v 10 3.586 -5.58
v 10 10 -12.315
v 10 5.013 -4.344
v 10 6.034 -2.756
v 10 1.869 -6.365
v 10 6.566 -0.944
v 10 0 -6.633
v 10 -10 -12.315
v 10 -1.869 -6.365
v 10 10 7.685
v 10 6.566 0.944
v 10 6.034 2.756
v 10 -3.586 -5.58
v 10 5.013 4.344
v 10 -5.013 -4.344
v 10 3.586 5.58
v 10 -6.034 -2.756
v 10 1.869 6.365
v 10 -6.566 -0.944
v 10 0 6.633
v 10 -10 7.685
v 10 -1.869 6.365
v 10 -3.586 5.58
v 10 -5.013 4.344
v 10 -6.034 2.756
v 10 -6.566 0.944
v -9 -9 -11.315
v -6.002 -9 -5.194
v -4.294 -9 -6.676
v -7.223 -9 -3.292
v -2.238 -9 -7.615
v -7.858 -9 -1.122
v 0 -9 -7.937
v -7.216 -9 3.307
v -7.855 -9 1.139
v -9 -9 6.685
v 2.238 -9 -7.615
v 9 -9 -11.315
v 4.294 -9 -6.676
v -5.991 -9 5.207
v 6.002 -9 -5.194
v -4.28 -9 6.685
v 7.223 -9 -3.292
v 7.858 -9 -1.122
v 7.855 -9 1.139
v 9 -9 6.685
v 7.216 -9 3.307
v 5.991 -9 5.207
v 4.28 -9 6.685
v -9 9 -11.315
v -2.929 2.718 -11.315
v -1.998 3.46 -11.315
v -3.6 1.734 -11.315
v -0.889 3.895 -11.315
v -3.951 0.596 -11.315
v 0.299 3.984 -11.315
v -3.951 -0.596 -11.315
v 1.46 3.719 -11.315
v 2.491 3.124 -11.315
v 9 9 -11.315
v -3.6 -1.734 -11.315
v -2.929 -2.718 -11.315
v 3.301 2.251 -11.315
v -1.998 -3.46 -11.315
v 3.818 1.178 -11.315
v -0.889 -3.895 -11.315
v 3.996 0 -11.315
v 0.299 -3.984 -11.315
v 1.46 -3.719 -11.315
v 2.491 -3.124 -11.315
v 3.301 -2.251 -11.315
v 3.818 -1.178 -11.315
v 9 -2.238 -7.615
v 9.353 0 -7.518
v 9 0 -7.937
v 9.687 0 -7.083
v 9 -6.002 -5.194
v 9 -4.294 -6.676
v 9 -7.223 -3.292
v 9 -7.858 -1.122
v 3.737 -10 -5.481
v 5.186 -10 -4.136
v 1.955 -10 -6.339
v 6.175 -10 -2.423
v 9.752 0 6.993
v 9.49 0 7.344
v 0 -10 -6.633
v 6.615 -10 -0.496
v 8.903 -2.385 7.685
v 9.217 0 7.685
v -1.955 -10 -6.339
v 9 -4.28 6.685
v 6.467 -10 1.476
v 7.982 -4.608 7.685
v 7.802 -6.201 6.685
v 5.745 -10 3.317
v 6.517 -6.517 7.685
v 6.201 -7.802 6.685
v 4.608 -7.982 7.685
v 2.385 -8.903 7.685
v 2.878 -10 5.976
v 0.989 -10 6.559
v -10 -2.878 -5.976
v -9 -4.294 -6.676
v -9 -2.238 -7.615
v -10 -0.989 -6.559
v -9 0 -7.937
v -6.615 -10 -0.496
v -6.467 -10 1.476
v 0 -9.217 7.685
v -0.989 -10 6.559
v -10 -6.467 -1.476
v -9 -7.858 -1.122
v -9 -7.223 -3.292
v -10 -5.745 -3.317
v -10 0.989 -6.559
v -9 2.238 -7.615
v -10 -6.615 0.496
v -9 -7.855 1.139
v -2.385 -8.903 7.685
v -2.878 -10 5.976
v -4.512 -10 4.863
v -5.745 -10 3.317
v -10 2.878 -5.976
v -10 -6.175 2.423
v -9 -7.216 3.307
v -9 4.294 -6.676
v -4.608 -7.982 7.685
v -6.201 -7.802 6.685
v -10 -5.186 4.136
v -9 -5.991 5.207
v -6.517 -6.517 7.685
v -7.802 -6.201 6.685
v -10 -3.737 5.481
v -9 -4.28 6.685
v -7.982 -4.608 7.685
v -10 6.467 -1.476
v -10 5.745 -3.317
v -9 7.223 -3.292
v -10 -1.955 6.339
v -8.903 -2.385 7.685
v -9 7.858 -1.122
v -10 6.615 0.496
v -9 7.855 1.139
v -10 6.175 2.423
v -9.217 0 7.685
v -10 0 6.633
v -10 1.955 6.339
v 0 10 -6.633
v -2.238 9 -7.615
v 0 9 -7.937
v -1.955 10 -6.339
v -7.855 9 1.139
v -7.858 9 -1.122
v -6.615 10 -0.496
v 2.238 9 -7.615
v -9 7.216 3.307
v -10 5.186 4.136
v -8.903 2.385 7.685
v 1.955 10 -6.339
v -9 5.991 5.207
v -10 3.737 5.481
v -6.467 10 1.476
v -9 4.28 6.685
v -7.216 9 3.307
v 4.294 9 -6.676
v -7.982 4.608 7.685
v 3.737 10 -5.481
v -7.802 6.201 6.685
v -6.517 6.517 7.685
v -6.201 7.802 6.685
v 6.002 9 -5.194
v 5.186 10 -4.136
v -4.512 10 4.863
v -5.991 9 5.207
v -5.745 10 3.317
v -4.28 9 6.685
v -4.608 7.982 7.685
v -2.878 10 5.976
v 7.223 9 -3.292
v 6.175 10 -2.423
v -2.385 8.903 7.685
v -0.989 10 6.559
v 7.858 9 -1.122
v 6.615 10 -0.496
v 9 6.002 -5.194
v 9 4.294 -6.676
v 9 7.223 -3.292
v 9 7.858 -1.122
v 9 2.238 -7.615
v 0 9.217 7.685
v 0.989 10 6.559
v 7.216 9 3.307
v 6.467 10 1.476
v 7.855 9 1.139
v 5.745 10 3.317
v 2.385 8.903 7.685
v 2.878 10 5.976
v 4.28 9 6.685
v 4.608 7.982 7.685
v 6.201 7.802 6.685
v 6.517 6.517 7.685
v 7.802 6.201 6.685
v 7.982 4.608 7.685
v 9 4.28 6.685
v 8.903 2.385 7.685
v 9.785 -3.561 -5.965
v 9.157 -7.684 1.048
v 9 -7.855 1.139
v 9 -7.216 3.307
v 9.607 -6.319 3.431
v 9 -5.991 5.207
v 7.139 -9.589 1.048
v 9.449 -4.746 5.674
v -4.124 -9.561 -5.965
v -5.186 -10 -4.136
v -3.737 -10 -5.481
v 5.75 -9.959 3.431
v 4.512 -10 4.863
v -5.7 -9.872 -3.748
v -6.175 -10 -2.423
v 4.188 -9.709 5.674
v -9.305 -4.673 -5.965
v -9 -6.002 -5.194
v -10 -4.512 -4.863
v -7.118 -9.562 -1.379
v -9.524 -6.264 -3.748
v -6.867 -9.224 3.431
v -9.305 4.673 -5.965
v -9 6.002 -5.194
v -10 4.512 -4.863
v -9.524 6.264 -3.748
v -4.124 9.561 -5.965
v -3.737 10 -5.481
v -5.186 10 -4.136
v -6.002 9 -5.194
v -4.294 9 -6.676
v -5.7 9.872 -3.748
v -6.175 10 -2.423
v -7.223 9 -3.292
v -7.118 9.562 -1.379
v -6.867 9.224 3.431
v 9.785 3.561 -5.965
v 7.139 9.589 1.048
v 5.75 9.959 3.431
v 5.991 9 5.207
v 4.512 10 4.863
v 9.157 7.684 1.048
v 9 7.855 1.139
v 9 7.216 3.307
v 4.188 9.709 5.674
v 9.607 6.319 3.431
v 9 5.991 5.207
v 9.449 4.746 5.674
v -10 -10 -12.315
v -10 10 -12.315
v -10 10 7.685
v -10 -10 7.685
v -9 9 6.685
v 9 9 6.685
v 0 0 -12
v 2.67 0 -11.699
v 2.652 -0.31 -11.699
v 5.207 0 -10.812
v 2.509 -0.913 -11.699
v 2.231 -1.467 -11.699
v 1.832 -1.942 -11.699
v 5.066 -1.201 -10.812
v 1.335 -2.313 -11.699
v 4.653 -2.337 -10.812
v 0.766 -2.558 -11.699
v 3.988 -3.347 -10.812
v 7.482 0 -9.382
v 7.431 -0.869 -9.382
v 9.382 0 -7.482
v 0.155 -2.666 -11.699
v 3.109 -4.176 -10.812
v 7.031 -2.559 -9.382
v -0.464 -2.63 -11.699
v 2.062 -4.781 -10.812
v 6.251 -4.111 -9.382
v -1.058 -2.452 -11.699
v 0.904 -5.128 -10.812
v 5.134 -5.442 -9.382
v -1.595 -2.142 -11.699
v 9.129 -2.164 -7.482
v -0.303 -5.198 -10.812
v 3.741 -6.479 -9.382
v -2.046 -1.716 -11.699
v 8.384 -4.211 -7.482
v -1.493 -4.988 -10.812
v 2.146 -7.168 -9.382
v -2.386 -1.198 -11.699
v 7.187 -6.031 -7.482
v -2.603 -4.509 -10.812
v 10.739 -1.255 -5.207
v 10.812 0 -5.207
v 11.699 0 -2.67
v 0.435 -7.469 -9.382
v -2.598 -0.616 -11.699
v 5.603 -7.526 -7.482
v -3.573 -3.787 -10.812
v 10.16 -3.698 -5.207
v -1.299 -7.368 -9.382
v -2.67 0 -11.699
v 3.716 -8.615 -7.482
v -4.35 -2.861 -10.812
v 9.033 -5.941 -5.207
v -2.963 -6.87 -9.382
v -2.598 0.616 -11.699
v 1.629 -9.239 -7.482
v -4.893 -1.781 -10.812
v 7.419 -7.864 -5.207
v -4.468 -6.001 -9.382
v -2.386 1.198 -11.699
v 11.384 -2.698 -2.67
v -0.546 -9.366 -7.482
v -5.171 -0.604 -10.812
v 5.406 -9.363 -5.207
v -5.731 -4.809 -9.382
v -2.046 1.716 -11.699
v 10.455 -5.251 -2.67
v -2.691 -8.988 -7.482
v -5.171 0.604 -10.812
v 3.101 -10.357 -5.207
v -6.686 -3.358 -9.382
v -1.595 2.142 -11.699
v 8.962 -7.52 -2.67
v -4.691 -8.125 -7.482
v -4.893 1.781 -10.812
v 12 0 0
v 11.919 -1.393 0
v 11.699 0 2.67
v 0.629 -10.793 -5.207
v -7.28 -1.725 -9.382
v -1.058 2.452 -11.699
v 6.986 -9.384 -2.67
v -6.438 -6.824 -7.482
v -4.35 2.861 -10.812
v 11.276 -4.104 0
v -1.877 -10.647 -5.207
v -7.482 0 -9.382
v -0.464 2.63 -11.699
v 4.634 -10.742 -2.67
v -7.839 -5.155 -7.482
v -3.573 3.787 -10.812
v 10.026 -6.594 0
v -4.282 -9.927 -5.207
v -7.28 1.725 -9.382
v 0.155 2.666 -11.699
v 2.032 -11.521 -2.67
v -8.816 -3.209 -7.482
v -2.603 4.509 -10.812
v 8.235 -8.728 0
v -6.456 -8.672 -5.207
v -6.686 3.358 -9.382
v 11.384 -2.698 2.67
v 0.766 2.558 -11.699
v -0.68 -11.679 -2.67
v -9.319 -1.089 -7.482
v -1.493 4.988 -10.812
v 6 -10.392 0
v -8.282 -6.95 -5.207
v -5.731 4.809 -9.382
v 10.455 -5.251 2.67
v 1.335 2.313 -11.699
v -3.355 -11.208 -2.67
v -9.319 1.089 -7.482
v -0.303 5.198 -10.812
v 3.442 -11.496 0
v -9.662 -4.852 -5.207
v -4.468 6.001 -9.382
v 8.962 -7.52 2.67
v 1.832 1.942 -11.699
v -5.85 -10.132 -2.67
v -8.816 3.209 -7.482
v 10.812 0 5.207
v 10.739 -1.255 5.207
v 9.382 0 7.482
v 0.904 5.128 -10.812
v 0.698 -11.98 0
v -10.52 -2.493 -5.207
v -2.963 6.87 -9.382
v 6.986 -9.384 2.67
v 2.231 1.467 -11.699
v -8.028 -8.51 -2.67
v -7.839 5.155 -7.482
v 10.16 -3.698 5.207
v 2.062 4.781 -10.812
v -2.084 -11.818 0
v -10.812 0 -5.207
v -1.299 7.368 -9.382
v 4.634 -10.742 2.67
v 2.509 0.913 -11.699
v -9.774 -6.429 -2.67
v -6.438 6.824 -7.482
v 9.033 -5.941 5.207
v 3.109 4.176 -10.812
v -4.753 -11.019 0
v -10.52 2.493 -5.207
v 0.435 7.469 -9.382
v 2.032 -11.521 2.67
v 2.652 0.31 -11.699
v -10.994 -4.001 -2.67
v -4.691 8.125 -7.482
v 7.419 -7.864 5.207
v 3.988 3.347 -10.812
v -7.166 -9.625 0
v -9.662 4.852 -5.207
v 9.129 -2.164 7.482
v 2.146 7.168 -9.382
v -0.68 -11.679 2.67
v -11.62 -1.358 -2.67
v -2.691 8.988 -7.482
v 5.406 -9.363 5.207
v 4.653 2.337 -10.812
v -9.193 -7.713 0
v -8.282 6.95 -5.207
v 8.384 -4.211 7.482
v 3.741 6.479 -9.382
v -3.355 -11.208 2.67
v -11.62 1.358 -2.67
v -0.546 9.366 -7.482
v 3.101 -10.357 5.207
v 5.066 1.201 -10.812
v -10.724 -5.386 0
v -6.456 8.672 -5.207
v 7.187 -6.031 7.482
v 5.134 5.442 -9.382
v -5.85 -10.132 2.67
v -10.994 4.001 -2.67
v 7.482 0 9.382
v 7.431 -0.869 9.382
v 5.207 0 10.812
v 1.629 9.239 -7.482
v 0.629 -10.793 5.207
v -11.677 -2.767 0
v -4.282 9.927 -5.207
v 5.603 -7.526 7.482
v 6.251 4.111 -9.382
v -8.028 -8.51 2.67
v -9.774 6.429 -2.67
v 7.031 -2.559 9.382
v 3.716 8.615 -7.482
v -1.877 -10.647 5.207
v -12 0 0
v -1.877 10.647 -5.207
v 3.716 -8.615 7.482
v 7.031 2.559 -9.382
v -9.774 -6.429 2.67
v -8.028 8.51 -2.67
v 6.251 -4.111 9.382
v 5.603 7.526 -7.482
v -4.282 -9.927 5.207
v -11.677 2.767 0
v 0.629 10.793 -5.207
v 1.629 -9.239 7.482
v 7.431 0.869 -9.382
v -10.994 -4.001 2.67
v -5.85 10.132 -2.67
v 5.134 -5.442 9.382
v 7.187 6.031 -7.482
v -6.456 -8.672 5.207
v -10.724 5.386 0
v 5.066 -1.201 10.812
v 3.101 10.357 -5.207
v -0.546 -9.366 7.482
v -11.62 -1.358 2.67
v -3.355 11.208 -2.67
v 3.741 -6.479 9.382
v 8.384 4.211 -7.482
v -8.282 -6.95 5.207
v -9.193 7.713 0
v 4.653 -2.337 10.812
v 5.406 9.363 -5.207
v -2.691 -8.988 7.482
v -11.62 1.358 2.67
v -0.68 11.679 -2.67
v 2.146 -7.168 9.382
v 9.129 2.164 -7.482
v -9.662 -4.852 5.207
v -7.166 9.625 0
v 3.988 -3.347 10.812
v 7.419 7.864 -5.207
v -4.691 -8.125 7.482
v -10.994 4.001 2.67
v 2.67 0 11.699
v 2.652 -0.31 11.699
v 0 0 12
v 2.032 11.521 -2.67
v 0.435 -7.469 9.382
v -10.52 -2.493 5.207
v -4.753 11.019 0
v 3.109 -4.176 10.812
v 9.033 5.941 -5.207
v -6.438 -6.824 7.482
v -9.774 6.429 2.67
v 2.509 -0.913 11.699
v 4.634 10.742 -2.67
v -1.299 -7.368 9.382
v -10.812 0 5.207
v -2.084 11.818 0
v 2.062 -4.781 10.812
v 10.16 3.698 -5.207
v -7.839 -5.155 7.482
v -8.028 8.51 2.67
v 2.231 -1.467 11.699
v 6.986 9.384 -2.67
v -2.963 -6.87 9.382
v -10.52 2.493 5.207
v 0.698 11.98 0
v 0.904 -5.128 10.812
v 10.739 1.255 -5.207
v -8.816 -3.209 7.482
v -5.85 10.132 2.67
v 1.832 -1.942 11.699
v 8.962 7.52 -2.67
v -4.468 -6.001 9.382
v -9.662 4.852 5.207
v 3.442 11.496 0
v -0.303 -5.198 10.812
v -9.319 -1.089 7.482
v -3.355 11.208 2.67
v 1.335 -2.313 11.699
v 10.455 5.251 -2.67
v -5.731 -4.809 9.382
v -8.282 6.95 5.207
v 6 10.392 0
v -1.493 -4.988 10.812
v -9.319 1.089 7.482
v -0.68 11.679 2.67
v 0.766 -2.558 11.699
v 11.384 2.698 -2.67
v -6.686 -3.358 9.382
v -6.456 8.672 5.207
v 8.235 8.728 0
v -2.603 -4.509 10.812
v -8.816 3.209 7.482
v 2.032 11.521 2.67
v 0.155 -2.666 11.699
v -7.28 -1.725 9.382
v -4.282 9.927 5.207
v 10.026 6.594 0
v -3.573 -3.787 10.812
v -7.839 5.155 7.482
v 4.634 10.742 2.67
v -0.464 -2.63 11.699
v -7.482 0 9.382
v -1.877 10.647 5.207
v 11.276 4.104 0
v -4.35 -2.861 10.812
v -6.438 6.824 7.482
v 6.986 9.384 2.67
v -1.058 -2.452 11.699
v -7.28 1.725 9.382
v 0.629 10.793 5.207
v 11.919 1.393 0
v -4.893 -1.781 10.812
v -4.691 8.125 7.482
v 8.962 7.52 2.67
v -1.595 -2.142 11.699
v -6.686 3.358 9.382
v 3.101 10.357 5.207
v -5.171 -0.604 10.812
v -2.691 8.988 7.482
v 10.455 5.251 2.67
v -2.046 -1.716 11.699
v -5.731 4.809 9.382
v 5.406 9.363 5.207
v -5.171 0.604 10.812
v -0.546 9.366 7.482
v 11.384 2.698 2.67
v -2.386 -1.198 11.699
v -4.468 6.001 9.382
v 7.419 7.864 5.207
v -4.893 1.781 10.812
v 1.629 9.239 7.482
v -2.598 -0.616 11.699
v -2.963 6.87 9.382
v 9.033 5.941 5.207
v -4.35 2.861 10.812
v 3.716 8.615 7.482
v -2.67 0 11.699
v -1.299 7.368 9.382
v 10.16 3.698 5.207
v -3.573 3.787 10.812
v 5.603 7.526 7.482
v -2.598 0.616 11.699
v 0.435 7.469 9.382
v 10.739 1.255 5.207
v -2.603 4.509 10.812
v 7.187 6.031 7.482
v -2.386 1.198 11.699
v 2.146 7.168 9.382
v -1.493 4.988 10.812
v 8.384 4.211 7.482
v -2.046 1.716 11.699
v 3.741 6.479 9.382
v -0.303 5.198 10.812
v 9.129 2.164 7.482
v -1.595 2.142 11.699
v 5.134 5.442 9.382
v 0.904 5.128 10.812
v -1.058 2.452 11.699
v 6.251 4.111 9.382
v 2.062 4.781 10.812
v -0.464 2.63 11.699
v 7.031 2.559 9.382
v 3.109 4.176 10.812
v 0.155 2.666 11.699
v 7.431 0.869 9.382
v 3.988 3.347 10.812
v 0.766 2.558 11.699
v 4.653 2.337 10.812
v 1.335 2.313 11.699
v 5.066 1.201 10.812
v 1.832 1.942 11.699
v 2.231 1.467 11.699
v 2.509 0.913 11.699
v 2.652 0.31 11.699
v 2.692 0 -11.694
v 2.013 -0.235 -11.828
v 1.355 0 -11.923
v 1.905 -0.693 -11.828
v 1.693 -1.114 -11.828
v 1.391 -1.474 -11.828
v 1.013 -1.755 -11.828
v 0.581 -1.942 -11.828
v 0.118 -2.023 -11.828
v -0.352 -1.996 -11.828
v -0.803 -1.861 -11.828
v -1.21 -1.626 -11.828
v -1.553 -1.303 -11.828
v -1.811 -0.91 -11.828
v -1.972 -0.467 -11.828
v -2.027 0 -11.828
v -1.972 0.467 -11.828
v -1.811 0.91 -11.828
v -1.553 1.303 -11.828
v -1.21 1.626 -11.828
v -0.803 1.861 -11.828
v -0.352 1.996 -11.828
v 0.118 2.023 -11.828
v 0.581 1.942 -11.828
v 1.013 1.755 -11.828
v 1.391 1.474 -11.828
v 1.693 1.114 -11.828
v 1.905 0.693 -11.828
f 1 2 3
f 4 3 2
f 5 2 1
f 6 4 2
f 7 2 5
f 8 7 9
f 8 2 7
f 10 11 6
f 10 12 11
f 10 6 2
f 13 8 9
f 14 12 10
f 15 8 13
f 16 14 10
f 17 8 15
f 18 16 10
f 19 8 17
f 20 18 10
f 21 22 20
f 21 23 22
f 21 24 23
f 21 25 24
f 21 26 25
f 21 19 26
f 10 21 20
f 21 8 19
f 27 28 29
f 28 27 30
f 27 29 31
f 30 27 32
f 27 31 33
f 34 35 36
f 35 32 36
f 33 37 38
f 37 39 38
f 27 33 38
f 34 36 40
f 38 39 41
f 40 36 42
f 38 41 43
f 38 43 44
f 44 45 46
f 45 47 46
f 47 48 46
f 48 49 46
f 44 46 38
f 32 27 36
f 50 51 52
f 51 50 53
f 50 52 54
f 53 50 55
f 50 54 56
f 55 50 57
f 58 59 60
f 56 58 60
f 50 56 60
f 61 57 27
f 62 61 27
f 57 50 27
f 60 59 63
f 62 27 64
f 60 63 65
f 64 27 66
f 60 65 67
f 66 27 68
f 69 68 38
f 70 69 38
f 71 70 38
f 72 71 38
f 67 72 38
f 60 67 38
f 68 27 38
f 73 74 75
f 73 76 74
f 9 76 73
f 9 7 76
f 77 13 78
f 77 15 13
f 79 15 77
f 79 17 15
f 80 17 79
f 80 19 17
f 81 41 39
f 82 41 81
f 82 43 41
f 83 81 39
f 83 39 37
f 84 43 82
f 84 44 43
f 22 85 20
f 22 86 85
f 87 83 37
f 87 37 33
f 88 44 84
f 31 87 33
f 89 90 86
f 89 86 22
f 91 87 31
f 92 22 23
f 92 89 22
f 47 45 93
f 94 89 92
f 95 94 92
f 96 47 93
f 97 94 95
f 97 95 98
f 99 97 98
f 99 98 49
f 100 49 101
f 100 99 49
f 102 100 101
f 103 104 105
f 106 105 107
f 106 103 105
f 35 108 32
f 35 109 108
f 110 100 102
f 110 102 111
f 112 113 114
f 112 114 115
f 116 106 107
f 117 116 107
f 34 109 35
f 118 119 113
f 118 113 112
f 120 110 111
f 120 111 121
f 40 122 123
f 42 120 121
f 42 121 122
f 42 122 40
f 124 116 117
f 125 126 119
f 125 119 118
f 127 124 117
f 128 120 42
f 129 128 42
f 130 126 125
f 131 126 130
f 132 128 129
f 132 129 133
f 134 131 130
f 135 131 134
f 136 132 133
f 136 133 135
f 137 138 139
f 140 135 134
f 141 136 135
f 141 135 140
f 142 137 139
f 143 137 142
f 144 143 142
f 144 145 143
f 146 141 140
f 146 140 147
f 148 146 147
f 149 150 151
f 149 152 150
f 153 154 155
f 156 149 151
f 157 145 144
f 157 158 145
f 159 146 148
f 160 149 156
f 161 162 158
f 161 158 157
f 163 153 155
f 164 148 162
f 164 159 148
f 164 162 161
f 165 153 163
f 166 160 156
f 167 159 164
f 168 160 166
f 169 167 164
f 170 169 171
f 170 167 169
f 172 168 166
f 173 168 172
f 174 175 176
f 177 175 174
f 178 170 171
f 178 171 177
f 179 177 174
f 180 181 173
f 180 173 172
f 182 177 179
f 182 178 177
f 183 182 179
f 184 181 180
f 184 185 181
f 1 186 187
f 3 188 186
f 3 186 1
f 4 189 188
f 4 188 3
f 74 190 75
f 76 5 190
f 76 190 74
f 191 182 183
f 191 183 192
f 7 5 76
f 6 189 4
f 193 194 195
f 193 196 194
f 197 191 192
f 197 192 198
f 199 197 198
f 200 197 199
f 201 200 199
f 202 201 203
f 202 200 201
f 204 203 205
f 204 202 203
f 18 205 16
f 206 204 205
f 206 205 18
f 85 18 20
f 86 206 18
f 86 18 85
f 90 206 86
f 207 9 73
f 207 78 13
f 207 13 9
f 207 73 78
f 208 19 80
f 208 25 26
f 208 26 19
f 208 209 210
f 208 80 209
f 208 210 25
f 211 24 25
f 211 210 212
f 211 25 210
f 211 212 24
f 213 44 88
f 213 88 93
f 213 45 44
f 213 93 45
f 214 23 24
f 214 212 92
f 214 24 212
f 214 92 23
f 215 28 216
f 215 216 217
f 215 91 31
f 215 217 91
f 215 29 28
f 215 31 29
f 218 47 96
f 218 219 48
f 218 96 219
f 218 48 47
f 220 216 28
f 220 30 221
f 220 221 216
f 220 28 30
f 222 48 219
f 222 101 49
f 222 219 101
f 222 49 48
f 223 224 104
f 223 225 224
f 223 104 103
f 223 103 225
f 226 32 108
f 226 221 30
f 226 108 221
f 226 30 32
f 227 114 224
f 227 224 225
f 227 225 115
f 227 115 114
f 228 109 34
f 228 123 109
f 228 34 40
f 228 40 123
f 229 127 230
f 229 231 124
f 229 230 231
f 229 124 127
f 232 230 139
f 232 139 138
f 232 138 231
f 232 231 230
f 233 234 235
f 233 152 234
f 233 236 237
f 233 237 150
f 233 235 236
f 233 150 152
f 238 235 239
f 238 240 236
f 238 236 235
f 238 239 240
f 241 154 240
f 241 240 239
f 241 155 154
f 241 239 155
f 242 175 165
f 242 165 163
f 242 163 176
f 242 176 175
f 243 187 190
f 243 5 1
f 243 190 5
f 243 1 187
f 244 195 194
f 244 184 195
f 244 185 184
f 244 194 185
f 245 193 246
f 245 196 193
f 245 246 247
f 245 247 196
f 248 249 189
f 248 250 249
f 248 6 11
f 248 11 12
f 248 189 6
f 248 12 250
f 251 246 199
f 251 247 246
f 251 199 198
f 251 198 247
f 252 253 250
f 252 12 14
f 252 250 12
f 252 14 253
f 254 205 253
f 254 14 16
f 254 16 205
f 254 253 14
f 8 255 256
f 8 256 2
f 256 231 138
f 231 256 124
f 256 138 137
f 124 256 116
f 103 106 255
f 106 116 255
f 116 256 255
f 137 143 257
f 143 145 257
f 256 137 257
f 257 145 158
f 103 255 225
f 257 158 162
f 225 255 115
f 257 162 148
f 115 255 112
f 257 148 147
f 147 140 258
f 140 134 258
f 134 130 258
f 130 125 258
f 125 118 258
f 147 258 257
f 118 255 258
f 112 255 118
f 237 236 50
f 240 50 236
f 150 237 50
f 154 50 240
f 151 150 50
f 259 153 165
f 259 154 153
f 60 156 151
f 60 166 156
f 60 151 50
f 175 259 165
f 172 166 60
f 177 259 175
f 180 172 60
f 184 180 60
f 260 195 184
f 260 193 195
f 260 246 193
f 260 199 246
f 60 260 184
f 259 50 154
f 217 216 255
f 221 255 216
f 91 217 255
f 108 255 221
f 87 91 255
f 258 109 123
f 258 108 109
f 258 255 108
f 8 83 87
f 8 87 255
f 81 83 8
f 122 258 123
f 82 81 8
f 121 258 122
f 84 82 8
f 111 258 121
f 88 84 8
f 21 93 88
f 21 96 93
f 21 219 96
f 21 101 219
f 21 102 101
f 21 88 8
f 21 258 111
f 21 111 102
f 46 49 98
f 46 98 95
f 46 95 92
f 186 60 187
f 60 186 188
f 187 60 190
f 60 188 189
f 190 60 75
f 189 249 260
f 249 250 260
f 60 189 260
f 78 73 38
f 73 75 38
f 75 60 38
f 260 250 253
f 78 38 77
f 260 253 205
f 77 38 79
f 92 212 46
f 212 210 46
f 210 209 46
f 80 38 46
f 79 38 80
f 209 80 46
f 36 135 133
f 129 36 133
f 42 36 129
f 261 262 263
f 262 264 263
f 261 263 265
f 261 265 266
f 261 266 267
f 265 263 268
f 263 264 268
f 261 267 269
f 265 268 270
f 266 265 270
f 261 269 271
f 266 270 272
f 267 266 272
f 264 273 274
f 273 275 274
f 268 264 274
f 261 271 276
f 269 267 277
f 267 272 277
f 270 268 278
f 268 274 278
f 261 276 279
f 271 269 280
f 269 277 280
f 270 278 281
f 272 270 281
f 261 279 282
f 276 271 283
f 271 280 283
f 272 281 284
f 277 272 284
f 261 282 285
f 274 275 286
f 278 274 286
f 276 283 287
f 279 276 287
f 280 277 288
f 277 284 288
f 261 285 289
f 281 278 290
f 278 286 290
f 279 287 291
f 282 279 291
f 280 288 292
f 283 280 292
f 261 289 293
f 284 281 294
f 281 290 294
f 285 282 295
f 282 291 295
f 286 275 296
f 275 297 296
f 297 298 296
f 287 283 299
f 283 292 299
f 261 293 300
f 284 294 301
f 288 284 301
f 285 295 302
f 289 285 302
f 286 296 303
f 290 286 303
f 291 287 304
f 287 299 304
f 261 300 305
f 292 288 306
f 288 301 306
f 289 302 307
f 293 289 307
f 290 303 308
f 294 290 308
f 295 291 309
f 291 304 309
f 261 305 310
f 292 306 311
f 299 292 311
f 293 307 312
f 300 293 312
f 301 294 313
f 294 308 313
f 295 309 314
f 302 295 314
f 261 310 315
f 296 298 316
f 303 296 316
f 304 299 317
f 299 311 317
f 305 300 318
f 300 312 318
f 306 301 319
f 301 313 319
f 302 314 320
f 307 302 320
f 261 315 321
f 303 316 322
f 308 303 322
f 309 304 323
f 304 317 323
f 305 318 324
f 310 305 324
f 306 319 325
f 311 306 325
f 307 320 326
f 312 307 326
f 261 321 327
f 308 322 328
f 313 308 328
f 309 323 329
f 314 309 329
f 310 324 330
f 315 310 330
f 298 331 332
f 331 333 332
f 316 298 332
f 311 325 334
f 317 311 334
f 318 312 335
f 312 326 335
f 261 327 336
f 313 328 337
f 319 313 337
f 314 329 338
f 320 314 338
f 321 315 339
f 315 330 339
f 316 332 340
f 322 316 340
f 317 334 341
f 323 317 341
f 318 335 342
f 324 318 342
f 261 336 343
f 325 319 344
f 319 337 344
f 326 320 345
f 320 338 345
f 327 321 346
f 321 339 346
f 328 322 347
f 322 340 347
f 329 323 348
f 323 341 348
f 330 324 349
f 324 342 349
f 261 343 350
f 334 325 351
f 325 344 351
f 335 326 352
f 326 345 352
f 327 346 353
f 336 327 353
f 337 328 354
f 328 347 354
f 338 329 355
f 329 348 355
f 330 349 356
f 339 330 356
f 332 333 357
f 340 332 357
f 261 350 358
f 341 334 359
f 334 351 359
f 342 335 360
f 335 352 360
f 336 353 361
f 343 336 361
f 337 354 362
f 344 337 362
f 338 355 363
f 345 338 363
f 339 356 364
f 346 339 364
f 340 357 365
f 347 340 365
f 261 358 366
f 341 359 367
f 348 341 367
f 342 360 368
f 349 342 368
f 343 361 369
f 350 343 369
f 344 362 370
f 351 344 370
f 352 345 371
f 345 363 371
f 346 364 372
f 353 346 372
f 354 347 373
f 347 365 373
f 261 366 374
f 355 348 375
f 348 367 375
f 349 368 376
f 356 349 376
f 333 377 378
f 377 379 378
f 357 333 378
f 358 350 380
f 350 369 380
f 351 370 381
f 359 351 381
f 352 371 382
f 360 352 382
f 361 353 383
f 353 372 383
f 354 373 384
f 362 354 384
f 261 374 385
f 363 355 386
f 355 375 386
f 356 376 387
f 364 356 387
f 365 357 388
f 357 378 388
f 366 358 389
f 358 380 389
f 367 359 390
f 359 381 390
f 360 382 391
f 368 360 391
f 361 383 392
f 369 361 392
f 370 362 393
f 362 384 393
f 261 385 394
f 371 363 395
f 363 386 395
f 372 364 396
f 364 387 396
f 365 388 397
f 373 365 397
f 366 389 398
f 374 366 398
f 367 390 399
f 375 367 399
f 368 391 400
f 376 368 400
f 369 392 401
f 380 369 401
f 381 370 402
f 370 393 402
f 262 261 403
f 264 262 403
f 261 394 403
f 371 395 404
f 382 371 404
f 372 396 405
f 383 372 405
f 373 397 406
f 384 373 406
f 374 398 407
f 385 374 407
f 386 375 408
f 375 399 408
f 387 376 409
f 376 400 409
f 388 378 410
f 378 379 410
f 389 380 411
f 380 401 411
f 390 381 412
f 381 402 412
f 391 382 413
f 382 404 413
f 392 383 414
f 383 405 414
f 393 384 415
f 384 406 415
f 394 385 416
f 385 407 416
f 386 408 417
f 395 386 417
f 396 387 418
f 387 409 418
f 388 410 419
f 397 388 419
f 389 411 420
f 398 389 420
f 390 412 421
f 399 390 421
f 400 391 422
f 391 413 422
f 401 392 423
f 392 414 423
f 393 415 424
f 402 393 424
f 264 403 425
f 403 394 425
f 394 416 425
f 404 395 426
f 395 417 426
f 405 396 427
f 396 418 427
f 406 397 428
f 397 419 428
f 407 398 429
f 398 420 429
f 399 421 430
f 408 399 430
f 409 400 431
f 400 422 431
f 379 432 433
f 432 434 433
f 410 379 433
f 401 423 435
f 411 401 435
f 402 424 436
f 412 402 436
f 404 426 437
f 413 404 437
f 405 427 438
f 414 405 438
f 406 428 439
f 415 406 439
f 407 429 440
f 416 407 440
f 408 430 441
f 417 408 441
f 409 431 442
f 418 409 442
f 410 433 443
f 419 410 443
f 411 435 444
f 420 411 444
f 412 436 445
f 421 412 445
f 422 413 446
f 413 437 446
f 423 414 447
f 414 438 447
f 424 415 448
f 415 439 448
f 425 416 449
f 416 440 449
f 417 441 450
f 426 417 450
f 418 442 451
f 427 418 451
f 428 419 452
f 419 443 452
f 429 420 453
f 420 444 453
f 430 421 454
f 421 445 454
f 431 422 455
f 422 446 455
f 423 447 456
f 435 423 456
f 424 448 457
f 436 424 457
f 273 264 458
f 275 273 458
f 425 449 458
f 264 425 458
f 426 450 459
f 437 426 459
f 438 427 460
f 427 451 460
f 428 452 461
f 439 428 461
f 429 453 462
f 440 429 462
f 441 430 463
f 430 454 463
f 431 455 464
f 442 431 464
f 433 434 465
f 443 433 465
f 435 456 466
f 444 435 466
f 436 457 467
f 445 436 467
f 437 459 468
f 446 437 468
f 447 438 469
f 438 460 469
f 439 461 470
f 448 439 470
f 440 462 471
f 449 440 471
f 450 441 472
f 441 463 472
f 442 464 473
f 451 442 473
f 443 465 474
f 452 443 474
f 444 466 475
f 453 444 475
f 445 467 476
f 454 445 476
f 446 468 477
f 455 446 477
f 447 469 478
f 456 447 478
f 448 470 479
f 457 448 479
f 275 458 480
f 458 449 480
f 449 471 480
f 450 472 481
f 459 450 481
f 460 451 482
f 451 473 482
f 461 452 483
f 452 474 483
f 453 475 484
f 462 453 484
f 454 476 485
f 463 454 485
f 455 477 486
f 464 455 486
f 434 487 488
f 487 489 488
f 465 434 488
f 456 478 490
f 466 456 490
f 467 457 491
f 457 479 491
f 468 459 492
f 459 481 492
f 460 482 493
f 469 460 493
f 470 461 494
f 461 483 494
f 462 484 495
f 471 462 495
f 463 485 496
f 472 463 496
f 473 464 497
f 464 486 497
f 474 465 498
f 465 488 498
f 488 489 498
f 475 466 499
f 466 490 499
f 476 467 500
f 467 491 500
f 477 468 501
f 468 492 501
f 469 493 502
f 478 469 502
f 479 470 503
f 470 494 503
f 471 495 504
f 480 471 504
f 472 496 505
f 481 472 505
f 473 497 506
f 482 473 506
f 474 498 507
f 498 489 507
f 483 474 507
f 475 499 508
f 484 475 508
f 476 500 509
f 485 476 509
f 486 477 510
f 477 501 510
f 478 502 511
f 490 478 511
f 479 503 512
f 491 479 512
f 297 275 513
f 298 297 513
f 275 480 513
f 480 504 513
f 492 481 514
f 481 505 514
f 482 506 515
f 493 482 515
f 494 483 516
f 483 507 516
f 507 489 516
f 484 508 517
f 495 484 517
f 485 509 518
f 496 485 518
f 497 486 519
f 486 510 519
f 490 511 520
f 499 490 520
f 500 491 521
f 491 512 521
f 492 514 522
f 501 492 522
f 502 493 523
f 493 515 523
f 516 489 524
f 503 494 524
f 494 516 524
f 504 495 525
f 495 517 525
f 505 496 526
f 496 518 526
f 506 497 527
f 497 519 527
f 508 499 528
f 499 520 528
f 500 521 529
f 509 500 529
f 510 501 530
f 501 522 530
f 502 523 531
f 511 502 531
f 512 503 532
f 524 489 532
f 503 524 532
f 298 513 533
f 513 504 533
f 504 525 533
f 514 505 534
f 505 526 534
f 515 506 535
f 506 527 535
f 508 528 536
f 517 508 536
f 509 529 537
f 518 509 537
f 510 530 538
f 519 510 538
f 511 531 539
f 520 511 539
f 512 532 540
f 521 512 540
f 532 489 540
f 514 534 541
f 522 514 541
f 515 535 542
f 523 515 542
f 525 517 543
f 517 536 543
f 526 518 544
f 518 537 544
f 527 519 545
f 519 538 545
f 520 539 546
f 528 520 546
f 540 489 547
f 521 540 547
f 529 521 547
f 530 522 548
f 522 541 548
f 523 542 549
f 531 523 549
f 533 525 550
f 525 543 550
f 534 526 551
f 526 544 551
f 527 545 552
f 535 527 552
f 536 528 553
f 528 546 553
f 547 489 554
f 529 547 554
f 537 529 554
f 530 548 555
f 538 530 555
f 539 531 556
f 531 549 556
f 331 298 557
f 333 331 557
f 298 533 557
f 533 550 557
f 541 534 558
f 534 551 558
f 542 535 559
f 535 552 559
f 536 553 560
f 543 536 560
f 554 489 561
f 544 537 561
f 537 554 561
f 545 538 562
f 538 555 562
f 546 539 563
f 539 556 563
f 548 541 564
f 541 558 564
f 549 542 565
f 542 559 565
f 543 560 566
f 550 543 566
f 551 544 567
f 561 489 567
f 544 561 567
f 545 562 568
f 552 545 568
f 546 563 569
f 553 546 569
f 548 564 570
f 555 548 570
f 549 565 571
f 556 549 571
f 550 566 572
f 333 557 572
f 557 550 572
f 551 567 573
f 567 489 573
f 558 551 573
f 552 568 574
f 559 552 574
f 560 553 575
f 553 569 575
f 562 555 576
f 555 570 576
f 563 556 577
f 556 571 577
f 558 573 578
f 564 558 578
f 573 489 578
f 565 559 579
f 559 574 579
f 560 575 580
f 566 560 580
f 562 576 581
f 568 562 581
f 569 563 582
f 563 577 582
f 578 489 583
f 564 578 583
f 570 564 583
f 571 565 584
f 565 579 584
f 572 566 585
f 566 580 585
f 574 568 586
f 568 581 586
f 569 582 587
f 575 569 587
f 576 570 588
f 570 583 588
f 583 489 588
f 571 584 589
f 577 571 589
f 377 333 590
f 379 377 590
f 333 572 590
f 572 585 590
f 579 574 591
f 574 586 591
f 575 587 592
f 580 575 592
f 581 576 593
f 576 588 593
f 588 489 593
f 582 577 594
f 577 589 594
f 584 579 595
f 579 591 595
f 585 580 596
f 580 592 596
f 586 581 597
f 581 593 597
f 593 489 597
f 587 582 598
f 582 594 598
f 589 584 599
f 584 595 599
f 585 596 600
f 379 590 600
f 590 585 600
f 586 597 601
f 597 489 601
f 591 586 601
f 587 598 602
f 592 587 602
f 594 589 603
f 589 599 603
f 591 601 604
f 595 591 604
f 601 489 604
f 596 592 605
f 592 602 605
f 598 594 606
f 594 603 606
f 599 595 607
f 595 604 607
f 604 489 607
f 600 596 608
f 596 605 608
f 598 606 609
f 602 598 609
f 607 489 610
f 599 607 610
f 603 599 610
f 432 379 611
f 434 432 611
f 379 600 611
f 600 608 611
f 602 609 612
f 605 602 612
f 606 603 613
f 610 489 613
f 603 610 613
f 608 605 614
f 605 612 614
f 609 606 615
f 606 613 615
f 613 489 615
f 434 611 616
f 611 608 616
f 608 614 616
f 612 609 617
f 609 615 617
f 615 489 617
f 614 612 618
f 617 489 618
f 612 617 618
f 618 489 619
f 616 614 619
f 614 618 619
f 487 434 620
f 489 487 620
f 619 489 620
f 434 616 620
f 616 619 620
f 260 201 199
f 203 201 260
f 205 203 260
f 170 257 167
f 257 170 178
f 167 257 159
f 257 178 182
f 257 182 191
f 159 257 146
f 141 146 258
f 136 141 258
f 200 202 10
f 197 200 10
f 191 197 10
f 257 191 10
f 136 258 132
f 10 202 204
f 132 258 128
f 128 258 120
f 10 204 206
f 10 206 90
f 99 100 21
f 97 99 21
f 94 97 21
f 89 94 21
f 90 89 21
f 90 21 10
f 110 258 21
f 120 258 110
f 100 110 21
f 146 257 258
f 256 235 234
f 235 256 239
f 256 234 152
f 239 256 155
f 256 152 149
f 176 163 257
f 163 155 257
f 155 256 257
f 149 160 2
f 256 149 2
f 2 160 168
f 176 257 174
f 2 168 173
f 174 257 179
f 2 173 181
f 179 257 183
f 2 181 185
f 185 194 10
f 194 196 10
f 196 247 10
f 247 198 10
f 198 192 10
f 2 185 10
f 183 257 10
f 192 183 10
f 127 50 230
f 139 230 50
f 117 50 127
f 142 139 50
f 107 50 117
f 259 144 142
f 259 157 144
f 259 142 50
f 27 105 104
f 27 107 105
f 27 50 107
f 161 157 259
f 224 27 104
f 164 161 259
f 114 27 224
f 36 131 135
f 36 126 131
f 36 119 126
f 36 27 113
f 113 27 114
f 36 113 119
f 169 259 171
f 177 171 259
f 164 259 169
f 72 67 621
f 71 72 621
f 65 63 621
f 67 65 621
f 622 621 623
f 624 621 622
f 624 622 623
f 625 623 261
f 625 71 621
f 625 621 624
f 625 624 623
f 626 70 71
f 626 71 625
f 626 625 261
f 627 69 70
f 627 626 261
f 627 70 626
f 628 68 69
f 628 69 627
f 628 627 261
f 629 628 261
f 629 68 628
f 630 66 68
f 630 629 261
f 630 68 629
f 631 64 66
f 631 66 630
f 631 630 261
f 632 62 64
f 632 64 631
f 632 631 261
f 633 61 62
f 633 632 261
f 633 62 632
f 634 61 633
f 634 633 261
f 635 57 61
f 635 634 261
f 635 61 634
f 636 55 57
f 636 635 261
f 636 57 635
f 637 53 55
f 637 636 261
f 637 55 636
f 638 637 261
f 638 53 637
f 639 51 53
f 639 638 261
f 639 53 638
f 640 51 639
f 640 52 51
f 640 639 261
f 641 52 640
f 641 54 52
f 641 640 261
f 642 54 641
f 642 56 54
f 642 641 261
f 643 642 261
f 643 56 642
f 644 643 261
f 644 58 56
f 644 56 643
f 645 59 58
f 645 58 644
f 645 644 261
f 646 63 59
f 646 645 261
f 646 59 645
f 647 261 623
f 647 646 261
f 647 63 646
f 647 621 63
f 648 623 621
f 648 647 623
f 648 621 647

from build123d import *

# Parameters (mm, degrees)
F2_W     = 20
F2_H     = 20
F3_DEPTH = 10
F4_T     = -1


with BuildPart() as f1:
    # F0 (on Front) → F1 (revolve)
    with BuildSketch(Plane.XZ):
        with BuildLine():
            ThreePointArc((0, -12), (12, 0), (0, 12))
            Line((0, 12), (0, -12))
        make_face()
    revolve(axis=Axis((0, 0, 0), (0, 0, -1)))


with BuildPart() as f3:
    # F2 (on Front) → F3 (new body, symmetric)
    with BuildSketch(Plane.XZ):
        with Locations((0, -2.3152874783)):
            Rectangle(F2_W, F2_H)
    extrude(amount=F3_DEPTH, both=True)

    # F4 (hollow: no face is removed)
    offset(amount=F4_T, mode=Mode.SUBTRACT)

    # F5: cut F1
    add(f1.part, mode=Mode.SUBTRACT)


solid = Compound([f1.part, f3.part])
